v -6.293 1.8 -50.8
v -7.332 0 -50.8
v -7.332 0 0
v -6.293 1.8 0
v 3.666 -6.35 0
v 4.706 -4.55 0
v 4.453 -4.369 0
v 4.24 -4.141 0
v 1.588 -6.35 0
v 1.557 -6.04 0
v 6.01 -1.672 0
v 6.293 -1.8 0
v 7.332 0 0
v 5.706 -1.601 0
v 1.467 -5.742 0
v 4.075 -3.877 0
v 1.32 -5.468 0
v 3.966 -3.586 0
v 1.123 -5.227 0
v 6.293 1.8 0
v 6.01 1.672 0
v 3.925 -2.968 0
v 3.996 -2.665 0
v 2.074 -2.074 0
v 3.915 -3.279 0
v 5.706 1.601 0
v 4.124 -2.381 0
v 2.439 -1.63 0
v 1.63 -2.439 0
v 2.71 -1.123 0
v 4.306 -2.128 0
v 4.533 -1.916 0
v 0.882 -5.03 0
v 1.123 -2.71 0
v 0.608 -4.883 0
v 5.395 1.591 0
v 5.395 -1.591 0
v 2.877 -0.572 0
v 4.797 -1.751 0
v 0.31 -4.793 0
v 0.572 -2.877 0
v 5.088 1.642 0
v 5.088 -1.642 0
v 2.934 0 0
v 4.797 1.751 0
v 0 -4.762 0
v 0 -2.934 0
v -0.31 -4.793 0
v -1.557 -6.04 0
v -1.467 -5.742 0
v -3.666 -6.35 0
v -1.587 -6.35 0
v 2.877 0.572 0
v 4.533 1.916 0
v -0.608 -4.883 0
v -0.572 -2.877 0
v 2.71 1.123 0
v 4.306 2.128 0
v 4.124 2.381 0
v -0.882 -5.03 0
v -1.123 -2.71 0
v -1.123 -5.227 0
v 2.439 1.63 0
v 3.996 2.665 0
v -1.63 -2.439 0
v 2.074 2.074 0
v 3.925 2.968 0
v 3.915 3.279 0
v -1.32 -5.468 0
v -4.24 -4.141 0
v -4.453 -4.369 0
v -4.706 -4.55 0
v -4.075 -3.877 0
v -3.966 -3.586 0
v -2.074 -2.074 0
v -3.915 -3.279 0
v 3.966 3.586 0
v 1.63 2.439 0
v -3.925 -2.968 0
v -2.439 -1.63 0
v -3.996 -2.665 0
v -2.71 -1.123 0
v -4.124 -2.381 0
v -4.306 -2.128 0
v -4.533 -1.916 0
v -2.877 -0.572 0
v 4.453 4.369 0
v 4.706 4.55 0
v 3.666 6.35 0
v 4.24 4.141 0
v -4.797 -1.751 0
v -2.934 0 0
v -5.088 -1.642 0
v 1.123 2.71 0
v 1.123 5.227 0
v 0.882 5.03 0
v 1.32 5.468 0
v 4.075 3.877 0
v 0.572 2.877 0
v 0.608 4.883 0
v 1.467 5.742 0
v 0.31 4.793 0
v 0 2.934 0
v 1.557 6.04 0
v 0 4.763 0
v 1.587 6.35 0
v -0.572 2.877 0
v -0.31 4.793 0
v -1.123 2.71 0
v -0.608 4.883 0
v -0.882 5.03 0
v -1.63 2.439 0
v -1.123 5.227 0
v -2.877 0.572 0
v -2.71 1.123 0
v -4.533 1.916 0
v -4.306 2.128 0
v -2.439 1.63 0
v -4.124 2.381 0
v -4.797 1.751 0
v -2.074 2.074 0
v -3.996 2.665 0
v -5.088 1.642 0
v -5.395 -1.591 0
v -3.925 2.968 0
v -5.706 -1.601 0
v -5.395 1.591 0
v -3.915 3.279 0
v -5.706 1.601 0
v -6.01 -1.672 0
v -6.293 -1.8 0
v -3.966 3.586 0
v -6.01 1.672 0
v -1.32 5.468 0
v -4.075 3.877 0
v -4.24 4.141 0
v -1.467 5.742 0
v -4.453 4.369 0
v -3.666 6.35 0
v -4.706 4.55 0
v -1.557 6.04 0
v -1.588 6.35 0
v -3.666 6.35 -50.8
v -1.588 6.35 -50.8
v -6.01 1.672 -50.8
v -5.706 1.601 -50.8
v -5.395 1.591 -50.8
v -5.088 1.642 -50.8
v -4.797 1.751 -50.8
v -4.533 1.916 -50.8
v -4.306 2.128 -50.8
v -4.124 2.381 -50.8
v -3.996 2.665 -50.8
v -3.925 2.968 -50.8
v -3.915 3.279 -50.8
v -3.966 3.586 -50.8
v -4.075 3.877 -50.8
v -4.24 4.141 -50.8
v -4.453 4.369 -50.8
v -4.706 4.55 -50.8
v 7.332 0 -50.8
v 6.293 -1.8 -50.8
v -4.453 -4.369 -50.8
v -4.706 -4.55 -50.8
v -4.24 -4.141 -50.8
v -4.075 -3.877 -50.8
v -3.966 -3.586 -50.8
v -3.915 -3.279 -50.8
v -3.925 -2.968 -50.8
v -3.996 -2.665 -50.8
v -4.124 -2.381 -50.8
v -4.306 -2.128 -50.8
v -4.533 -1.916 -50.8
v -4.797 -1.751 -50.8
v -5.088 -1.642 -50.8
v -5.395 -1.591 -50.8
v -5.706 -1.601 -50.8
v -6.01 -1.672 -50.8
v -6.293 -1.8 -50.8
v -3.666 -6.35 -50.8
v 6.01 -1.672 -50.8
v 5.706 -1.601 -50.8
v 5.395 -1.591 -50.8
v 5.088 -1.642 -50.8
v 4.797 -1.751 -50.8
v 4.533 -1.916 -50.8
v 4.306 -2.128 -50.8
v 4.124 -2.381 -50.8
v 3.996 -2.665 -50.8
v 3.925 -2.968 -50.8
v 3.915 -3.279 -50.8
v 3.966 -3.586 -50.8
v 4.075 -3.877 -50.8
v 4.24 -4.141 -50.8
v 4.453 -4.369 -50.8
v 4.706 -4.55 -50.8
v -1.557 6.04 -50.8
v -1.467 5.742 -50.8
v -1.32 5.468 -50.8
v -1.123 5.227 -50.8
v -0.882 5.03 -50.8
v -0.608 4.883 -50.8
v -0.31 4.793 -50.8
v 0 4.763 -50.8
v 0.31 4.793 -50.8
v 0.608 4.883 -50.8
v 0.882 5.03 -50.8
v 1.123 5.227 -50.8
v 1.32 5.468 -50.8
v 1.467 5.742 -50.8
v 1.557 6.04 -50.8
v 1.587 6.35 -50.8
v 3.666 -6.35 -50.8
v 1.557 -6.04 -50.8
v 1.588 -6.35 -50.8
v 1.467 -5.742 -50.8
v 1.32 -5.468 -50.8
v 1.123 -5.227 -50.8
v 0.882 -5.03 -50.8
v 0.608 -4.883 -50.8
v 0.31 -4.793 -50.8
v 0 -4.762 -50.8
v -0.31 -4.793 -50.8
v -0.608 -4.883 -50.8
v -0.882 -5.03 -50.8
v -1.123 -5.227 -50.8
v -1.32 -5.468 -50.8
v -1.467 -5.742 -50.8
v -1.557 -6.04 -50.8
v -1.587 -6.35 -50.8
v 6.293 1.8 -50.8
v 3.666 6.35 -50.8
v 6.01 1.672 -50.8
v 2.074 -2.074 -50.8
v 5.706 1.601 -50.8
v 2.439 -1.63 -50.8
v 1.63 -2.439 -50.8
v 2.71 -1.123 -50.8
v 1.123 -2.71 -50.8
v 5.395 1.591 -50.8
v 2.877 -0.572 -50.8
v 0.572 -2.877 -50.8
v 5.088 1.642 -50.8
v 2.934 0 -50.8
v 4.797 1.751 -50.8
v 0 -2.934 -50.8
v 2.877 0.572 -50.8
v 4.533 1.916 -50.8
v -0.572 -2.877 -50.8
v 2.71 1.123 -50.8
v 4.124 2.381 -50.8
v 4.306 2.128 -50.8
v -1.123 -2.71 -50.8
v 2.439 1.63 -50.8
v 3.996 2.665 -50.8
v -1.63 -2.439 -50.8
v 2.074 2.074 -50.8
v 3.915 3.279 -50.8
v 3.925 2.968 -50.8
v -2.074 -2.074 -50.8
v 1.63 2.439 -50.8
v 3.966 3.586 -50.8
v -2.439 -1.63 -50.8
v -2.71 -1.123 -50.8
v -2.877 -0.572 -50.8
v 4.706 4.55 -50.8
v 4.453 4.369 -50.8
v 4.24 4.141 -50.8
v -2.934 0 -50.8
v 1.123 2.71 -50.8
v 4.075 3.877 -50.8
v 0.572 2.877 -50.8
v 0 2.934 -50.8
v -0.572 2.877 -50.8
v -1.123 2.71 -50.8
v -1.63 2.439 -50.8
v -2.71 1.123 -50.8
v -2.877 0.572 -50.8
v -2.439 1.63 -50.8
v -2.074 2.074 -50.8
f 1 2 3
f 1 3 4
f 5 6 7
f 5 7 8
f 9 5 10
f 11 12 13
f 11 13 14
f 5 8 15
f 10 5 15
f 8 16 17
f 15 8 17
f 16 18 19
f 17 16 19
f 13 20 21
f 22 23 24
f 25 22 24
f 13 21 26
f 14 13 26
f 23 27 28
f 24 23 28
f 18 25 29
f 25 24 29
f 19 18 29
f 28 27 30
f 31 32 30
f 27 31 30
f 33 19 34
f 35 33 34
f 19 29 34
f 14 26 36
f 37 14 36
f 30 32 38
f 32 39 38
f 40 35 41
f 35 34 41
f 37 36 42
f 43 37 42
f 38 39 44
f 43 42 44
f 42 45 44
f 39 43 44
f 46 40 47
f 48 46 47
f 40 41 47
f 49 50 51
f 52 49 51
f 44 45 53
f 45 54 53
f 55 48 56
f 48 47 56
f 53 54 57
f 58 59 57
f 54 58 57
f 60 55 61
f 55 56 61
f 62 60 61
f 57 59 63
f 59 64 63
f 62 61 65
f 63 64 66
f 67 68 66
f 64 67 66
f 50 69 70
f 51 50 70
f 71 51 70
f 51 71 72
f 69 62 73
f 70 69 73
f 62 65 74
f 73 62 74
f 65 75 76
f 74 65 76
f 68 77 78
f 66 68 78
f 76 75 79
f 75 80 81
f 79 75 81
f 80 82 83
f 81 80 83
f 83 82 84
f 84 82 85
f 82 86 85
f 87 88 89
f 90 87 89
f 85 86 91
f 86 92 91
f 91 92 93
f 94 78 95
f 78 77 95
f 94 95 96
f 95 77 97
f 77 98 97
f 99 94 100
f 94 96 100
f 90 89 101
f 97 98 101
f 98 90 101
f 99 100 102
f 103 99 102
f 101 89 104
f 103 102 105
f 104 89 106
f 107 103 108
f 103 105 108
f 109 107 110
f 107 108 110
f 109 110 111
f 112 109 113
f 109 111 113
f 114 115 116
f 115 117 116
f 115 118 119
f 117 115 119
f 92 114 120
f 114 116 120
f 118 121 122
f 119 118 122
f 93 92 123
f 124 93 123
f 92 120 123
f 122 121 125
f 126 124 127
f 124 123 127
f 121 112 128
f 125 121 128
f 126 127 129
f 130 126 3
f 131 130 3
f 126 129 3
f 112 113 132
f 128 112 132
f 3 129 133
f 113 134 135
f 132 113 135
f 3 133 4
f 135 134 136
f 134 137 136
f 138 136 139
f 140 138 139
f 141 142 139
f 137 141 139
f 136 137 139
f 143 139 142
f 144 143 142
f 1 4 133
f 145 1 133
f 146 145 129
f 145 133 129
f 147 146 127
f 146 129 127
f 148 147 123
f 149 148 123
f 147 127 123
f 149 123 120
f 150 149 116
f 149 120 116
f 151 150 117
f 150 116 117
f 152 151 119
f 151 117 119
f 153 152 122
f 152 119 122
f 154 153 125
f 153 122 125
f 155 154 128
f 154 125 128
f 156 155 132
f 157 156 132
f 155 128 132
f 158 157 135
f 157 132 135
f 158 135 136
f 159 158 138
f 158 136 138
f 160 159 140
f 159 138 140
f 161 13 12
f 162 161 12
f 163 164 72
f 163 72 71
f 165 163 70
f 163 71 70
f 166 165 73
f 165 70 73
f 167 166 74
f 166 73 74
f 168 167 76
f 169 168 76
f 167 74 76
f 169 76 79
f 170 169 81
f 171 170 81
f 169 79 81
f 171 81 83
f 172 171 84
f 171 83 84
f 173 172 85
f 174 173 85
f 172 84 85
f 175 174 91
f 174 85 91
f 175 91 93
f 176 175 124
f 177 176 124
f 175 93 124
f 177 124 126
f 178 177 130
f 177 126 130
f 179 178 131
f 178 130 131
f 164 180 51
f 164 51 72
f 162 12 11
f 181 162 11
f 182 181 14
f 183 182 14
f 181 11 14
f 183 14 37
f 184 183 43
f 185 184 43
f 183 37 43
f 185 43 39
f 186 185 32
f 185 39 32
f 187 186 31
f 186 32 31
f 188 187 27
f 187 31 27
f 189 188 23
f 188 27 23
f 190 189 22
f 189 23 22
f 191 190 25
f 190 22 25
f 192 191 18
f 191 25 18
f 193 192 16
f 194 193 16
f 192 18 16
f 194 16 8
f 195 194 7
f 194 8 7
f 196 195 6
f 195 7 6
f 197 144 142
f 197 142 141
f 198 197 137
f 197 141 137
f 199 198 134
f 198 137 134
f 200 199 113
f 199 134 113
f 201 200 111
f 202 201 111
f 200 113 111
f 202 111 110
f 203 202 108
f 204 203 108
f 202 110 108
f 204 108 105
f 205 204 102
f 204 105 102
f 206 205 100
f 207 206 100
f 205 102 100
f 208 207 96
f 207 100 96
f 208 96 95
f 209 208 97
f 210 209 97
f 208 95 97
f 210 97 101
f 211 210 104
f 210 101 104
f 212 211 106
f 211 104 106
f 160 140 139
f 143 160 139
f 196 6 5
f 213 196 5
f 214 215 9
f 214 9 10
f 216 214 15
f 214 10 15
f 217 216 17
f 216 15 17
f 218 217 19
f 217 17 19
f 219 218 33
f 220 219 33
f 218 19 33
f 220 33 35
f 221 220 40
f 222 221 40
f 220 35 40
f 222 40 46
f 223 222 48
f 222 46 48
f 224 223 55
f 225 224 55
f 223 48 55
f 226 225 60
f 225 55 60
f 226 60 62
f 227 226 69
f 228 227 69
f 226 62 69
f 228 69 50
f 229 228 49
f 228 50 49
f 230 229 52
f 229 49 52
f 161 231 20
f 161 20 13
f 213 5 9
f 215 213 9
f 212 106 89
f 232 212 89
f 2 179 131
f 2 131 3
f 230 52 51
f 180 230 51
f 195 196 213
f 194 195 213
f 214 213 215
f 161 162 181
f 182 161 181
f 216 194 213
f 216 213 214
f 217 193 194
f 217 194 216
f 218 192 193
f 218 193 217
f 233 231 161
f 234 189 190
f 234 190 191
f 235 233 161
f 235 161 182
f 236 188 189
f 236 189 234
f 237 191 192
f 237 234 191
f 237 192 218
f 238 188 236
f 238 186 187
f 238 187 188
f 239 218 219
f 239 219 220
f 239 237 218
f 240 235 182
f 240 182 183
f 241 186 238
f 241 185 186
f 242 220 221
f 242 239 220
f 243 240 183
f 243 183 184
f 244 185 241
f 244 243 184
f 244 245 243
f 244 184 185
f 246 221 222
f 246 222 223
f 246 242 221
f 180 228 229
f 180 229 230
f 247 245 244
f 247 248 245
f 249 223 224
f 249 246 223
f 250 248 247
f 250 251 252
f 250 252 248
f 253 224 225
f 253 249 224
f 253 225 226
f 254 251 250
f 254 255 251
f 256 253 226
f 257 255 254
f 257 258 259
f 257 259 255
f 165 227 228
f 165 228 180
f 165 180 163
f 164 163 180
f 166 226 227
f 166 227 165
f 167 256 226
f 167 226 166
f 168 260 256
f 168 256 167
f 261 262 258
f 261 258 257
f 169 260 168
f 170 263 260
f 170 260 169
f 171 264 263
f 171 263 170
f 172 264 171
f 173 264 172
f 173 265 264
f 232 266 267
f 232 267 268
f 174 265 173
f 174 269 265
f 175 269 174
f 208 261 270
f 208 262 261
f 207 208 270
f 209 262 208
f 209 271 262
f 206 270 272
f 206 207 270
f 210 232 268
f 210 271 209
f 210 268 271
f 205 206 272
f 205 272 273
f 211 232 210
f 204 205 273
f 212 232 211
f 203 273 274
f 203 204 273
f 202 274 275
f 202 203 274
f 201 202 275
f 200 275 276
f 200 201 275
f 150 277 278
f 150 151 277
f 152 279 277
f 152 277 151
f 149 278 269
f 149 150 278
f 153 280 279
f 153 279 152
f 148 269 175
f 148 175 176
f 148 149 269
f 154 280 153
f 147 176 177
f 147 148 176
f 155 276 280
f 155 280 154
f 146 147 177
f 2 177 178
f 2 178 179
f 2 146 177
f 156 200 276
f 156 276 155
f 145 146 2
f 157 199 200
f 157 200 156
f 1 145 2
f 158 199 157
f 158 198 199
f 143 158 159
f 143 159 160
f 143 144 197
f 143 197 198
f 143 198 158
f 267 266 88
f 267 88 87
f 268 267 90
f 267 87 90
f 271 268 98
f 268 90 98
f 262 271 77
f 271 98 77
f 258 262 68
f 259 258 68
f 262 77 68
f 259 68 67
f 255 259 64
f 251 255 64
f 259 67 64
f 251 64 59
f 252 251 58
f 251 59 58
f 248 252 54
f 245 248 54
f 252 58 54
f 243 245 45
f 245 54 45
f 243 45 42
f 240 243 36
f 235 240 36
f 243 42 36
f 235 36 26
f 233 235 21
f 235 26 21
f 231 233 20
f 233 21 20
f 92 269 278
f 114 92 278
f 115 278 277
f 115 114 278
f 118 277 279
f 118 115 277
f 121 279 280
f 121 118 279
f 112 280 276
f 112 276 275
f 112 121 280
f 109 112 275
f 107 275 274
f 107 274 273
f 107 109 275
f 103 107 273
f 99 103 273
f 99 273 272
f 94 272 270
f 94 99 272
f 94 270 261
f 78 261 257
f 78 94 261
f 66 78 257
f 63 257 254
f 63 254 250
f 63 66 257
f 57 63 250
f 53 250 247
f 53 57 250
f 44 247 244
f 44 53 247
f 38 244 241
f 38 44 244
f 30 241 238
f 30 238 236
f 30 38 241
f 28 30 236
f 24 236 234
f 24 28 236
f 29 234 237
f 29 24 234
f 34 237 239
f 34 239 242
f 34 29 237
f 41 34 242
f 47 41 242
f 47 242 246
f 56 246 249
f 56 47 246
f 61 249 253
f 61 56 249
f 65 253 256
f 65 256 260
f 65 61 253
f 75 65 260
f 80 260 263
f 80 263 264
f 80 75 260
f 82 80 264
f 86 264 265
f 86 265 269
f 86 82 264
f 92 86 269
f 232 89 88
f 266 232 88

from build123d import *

# Parameters (mm, degrees)
SKETCH1_R           = 2.9337
BOSS_EXTRUDE1_DEPTH = 50.8


with BuildPart() as part:
    # Sketch1 → Boss-Extrude1 (new body)
    with BuildSketch(Plane(origin=(0, 0, 0), x_dir=(-1, 0, 0), z_dir=(0, 0, -1))):
        with BuildLine():
            Line((-4.70551159, -4.549815043), (-3.666174521, -6.349999904))
            Line((-3.666174521, -6.349999904), (-1.587500385, -6.349999904))
            ThreePointArc((-1.587500385, -6.349999904), (-3.85e-07, -4.762499904), (1.587499615, -6.349999904))
            Line((1.587499615, -6.349999904), (3.666173825, -6.349999904))
            Line((3.666173825, -6.349999904), (4.705510942, -4.54981524))
            ThreePointArc((4.705510942, -4.54981524), (4.124445629, -2.381249907), (6.293010962, -1.800184594))
            Line((6.293010962, -1.800184594), (7.332348079, 7e-08))
            Line((7.332348079, 7e-08), (6.293011217, 1.800184685))
            ThreePointArc((6.293011217, 1.800184685), (4.124445939, 2.381250203), (4.705511457, 4.549815481))
            Line((4.705511457, 4.549815481), (3.666174521, 6.350000222))
            Line((3.666174521, 6.350000222), (1.587500385, 6.350000222))
            ThreePointArc((1.587500385, 6.350000222), (3.85e-07, 4.762500222), (-1.587499615, 6.350000222))
            Line((-1.587499615, 6.350000222), (-3.666173825, 6.350000222))
            Line((-3.666173825, 6.350000222), (-4.705511038, 4.549815614))
            ThreePointArc((-4.705511038, 4.549815614), (-4.124445841, 2.38125025), (-6.293011205, 1.800185053))
            Line((-6.293011205, 1.800185053), (-7.332348419, 4.44e-07))
            Line((-7.332348419, 4.44e-07), (-6.293011423, -1.80018429))
            ThreePointArc((-6.293011423, -1.80018429), (-4.12444613, -2.38124975), (-4.70551159, -4.549815043))
        make_face()
        Circle(SKETCH1_R, mode=Mode.SUBTRACT)
    extrude(amount=BOSS_EXTRUDE1_DEPTH)


solid = part.part
